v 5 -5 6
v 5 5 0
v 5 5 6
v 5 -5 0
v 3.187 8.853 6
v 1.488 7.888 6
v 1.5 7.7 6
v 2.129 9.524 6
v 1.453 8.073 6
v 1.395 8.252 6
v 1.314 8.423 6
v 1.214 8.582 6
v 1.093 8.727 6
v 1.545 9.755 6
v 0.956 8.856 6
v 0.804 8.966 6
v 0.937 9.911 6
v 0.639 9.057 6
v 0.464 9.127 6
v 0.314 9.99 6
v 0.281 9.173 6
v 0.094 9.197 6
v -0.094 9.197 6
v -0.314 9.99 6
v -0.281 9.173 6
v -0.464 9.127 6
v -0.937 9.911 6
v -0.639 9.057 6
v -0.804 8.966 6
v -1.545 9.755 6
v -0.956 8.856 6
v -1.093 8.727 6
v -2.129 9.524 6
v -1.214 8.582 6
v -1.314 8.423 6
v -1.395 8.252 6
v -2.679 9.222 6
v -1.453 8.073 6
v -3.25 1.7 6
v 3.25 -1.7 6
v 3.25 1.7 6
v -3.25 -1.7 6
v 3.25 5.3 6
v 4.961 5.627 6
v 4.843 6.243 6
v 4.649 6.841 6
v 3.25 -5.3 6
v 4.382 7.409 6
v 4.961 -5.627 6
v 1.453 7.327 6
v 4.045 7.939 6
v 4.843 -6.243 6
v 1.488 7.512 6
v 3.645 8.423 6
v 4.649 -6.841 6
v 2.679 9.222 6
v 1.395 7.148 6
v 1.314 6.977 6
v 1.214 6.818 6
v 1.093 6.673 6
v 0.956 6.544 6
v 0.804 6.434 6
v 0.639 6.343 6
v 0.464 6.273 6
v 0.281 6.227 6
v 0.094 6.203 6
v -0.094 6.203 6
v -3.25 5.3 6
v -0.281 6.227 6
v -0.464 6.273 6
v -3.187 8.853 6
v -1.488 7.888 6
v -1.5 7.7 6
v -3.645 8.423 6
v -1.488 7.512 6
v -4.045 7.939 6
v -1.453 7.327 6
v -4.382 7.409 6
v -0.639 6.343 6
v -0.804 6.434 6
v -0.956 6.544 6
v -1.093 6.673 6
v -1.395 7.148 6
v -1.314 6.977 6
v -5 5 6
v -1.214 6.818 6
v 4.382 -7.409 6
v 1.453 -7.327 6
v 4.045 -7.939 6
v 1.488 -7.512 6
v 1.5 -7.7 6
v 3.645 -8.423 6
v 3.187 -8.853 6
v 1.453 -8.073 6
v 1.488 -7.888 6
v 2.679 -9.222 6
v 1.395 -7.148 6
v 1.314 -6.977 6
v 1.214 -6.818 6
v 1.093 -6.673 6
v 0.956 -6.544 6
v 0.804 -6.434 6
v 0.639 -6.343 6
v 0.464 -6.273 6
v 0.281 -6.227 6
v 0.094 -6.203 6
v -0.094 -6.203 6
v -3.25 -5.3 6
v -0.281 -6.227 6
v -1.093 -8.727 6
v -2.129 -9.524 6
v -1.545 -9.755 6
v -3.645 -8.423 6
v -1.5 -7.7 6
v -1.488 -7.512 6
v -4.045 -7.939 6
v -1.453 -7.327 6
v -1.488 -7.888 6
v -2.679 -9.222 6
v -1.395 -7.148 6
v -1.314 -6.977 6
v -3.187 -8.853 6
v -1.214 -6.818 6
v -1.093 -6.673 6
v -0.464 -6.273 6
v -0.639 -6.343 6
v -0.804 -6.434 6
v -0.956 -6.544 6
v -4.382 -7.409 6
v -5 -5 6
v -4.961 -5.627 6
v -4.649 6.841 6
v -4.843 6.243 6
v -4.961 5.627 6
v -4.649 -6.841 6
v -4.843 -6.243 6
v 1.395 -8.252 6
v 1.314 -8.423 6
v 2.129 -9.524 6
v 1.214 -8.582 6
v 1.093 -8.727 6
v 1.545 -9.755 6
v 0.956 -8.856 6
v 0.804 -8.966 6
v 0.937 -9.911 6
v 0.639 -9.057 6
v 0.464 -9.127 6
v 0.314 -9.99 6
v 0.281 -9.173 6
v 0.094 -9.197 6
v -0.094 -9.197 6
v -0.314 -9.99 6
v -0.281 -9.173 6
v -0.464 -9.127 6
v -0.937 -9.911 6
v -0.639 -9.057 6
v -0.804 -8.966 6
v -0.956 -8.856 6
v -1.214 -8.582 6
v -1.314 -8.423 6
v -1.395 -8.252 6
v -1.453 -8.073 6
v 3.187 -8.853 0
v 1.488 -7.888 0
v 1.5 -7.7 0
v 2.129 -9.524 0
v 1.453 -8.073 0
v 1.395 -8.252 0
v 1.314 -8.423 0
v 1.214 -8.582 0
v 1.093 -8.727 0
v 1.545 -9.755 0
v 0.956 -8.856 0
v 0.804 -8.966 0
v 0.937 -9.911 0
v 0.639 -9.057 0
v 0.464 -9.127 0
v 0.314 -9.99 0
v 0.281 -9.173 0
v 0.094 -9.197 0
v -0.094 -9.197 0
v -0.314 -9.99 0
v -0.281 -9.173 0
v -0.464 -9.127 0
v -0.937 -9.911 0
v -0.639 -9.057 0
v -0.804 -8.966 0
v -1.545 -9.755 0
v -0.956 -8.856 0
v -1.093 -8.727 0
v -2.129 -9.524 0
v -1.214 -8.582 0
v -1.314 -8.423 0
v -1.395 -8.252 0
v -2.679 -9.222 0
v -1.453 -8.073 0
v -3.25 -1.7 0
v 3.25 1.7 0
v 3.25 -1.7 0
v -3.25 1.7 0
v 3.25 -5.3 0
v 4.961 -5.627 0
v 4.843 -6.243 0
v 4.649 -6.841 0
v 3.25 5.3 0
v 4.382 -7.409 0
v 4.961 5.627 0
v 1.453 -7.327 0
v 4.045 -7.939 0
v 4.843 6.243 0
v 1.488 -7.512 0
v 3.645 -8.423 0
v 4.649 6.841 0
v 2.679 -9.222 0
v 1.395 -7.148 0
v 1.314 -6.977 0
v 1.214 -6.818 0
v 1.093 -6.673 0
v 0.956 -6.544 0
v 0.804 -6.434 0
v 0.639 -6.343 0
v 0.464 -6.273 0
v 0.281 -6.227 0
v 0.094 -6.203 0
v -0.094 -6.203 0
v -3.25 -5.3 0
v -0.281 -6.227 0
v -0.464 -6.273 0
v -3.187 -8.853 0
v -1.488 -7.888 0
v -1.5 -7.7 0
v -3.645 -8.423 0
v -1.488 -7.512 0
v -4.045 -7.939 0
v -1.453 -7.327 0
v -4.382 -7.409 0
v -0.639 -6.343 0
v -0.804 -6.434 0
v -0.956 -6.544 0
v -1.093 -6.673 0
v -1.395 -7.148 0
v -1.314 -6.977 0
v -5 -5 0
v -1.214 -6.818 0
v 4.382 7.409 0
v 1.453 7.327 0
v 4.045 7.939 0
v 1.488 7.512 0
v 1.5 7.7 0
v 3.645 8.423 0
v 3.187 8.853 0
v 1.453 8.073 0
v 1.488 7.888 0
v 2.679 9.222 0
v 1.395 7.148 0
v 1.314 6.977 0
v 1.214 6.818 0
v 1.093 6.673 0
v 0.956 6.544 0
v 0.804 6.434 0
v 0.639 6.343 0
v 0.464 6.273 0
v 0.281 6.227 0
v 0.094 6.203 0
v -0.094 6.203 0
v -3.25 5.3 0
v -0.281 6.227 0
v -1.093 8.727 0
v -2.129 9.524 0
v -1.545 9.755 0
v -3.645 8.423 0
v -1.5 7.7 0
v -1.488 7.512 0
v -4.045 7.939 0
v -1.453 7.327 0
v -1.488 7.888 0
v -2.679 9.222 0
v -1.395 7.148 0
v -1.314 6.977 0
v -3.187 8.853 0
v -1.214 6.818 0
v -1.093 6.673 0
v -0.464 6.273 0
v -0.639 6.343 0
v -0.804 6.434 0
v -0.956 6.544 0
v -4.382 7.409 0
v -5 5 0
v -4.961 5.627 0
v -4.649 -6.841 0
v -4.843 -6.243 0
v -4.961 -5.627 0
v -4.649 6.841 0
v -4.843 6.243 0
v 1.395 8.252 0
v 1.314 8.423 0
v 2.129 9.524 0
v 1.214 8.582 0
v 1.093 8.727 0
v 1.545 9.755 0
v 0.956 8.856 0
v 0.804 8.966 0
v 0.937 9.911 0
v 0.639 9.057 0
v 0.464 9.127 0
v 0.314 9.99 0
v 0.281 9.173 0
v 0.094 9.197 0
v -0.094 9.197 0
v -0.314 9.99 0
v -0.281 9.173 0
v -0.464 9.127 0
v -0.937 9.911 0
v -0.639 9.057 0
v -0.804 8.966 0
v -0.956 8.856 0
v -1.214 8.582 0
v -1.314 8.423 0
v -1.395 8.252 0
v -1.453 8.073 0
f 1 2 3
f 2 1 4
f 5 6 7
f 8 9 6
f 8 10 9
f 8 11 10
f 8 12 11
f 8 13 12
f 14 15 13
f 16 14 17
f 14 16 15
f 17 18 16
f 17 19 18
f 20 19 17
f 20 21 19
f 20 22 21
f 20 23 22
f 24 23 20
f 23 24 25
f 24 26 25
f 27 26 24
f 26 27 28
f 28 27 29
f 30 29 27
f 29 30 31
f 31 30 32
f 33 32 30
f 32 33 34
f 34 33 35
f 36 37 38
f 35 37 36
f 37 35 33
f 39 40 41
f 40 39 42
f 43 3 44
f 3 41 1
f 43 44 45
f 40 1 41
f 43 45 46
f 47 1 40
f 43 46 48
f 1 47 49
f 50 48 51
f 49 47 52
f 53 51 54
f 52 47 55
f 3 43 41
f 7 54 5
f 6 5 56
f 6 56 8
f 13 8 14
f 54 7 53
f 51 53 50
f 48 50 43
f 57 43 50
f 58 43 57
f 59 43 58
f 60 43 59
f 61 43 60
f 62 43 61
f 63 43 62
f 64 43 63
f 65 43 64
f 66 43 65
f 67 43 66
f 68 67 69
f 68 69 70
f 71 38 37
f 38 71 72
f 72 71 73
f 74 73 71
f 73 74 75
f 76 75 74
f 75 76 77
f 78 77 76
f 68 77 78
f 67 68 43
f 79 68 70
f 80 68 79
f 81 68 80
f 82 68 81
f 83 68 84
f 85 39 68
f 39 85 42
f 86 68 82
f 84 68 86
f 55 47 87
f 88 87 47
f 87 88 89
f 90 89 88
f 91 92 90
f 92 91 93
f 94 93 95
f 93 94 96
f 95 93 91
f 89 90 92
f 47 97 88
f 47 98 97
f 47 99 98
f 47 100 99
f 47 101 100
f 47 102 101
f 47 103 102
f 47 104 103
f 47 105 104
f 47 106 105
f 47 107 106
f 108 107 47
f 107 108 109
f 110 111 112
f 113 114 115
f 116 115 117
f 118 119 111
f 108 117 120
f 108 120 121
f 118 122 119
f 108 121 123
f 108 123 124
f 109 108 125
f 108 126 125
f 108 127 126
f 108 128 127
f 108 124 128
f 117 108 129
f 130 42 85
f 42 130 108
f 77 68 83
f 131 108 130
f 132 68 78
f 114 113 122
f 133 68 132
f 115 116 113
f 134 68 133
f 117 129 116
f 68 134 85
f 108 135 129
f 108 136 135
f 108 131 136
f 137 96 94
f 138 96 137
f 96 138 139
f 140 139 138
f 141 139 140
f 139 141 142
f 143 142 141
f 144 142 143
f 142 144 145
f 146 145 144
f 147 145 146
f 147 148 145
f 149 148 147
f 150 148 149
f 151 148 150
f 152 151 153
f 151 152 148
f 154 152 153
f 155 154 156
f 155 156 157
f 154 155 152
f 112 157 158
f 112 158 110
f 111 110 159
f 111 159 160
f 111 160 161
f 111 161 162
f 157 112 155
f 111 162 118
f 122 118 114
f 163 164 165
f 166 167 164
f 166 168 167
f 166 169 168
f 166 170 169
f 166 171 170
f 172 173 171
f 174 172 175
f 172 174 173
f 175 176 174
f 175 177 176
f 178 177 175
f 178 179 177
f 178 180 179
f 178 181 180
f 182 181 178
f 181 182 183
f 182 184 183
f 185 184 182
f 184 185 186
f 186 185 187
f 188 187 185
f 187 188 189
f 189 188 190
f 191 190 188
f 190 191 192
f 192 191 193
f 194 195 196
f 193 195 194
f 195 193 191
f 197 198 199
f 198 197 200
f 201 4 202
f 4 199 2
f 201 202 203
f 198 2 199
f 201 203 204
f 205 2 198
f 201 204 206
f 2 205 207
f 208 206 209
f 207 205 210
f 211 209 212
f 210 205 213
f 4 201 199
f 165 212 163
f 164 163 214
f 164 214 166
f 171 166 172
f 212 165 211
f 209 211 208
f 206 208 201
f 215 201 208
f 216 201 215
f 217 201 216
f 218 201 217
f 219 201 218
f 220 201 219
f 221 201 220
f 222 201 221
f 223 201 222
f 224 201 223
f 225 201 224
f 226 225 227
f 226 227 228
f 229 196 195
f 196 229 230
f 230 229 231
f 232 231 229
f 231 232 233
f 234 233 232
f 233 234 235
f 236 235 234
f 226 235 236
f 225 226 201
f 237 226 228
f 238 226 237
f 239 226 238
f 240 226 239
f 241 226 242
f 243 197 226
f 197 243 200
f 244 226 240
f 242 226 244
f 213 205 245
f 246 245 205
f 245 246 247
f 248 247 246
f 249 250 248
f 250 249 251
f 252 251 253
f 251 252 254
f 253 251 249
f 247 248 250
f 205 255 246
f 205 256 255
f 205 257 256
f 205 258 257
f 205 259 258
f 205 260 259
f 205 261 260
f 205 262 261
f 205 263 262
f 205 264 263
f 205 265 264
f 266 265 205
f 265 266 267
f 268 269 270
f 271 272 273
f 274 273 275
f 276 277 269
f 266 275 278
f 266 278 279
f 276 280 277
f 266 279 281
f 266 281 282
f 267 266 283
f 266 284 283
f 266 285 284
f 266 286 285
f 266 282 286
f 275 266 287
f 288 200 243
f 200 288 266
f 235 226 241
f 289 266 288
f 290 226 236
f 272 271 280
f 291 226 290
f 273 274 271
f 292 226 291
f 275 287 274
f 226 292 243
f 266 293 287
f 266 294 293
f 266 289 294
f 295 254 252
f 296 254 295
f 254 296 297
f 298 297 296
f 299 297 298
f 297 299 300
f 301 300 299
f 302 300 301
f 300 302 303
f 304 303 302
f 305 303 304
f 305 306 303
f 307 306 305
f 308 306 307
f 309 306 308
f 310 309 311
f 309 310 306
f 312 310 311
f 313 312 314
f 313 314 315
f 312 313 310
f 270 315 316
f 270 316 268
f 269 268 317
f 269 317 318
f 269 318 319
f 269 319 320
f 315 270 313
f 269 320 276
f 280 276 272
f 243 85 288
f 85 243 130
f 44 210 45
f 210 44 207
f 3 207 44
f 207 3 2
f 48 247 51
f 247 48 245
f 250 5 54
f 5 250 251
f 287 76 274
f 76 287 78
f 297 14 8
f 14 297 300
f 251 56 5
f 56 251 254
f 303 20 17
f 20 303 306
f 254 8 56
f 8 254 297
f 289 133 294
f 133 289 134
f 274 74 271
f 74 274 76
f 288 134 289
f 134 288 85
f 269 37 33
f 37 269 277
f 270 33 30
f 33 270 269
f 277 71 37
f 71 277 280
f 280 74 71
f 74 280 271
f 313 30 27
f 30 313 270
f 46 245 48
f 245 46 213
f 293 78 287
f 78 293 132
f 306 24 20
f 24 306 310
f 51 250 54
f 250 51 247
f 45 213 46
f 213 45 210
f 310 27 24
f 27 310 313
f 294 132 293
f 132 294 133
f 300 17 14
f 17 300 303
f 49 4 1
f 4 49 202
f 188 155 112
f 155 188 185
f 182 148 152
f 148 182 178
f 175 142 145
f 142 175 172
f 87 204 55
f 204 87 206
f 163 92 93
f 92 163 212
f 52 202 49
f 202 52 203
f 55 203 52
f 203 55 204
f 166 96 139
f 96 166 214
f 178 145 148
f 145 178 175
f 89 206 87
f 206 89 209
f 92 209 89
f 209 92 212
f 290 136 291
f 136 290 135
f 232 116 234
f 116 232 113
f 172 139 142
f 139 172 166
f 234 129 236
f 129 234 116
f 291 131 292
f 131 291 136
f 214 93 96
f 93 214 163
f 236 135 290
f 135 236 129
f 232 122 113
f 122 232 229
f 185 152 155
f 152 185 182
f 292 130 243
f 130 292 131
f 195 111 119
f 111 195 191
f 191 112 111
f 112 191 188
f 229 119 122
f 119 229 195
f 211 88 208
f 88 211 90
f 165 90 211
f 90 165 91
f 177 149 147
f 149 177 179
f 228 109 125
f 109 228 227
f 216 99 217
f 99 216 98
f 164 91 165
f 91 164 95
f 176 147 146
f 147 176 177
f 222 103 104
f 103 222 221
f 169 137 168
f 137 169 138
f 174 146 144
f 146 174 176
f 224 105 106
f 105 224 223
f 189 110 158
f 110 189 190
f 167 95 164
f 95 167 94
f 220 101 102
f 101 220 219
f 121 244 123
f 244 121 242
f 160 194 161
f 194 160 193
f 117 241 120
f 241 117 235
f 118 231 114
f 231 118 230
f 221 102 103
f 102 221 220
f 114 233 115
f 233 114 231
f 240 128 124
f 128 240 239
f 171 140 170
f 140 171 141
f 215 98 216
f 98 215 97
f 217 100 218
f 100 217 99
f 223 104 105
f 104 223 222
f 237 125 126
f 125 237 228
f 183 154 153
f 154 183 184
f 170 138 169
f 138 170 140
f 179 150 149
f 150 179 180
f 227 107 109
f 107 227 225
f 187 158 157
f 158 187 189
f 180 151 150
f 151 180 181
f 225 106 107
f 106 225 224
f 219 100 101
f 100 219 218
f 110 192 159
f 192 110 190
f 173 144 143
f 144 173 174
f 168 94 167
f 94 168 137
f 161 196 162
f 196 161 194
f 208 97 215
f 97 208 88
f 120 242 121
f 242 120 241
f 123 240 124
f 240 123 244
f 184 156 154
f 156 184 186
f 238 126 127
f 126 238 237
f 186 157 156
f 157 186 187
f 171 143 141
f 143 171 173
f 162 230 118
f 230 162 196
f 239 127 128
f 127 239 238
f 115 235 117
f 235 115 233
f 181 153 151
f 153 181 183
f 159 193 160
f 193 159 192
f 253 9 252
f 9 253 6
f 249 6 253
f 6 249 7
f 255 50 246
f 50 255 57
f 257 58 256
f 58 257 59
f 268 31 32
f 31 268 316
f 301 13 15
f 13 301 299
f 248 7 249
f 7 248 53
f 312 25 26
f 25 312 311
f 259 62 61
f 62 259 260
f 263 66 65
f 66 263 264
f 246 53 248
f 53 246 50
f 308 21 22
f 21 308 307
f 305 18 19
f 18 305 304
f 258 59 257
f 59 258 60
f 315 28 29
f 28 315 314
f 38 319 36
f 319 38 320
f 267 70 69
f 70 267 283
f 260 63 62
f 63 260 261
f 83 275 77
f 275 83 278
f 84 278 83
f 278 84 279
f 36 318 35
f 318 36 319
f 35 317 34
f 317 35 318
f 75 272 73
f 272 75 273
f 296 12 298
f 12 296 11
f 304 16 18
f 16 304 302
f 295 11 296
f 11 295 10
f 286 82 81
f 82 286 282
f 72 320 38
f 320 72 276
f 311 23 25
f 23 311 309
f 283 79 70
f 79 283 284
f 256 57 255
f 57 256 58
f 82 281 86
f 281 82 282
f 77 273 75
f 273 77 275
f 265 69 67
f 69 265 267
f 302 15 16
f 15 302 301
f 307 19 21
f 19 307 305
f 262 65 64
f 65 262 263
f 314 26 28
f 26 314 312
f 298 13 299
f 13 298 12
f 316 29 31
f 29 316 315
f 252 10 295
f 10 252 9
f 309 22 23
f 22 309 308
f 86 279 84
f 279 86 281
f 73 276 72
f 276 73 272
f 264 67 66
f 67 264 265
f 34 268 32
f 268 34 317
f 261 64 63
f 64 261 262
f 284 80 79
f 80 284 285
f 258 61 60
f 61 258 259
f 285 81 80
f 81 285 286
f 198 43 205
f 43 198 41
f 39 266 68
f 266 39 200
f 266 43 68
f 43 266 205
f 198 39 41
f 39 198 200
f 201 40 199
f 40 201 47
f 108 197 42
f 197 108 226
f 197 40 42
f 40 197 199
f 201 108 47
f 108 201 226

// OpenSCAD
difference(){
union(){
translate([0,0,3]){

cube([10,10,6],center=true);}


translate([0,5,3]){
cylinder(h=6, r=5,$fn=50, center=true);}
    
   translate([0,-5,3]){
cylinder(h=6, r=5,$fn=50, center=true);} 
    
}
translate([0,-7.7,3]){
cylinder(h=6.3, r=1.5,$fn=50, center=true);}

translate([0,7.7,3]){

cylinder(h=6.3, r=1.5,$fn=50, center=true);}

translate([0,3.5,3]){

cube([6.5,3.6,6.1],center=true);}

translate([0,-3.5,3]){

cube([6.5,3.6,6.1],center=true);}
}
